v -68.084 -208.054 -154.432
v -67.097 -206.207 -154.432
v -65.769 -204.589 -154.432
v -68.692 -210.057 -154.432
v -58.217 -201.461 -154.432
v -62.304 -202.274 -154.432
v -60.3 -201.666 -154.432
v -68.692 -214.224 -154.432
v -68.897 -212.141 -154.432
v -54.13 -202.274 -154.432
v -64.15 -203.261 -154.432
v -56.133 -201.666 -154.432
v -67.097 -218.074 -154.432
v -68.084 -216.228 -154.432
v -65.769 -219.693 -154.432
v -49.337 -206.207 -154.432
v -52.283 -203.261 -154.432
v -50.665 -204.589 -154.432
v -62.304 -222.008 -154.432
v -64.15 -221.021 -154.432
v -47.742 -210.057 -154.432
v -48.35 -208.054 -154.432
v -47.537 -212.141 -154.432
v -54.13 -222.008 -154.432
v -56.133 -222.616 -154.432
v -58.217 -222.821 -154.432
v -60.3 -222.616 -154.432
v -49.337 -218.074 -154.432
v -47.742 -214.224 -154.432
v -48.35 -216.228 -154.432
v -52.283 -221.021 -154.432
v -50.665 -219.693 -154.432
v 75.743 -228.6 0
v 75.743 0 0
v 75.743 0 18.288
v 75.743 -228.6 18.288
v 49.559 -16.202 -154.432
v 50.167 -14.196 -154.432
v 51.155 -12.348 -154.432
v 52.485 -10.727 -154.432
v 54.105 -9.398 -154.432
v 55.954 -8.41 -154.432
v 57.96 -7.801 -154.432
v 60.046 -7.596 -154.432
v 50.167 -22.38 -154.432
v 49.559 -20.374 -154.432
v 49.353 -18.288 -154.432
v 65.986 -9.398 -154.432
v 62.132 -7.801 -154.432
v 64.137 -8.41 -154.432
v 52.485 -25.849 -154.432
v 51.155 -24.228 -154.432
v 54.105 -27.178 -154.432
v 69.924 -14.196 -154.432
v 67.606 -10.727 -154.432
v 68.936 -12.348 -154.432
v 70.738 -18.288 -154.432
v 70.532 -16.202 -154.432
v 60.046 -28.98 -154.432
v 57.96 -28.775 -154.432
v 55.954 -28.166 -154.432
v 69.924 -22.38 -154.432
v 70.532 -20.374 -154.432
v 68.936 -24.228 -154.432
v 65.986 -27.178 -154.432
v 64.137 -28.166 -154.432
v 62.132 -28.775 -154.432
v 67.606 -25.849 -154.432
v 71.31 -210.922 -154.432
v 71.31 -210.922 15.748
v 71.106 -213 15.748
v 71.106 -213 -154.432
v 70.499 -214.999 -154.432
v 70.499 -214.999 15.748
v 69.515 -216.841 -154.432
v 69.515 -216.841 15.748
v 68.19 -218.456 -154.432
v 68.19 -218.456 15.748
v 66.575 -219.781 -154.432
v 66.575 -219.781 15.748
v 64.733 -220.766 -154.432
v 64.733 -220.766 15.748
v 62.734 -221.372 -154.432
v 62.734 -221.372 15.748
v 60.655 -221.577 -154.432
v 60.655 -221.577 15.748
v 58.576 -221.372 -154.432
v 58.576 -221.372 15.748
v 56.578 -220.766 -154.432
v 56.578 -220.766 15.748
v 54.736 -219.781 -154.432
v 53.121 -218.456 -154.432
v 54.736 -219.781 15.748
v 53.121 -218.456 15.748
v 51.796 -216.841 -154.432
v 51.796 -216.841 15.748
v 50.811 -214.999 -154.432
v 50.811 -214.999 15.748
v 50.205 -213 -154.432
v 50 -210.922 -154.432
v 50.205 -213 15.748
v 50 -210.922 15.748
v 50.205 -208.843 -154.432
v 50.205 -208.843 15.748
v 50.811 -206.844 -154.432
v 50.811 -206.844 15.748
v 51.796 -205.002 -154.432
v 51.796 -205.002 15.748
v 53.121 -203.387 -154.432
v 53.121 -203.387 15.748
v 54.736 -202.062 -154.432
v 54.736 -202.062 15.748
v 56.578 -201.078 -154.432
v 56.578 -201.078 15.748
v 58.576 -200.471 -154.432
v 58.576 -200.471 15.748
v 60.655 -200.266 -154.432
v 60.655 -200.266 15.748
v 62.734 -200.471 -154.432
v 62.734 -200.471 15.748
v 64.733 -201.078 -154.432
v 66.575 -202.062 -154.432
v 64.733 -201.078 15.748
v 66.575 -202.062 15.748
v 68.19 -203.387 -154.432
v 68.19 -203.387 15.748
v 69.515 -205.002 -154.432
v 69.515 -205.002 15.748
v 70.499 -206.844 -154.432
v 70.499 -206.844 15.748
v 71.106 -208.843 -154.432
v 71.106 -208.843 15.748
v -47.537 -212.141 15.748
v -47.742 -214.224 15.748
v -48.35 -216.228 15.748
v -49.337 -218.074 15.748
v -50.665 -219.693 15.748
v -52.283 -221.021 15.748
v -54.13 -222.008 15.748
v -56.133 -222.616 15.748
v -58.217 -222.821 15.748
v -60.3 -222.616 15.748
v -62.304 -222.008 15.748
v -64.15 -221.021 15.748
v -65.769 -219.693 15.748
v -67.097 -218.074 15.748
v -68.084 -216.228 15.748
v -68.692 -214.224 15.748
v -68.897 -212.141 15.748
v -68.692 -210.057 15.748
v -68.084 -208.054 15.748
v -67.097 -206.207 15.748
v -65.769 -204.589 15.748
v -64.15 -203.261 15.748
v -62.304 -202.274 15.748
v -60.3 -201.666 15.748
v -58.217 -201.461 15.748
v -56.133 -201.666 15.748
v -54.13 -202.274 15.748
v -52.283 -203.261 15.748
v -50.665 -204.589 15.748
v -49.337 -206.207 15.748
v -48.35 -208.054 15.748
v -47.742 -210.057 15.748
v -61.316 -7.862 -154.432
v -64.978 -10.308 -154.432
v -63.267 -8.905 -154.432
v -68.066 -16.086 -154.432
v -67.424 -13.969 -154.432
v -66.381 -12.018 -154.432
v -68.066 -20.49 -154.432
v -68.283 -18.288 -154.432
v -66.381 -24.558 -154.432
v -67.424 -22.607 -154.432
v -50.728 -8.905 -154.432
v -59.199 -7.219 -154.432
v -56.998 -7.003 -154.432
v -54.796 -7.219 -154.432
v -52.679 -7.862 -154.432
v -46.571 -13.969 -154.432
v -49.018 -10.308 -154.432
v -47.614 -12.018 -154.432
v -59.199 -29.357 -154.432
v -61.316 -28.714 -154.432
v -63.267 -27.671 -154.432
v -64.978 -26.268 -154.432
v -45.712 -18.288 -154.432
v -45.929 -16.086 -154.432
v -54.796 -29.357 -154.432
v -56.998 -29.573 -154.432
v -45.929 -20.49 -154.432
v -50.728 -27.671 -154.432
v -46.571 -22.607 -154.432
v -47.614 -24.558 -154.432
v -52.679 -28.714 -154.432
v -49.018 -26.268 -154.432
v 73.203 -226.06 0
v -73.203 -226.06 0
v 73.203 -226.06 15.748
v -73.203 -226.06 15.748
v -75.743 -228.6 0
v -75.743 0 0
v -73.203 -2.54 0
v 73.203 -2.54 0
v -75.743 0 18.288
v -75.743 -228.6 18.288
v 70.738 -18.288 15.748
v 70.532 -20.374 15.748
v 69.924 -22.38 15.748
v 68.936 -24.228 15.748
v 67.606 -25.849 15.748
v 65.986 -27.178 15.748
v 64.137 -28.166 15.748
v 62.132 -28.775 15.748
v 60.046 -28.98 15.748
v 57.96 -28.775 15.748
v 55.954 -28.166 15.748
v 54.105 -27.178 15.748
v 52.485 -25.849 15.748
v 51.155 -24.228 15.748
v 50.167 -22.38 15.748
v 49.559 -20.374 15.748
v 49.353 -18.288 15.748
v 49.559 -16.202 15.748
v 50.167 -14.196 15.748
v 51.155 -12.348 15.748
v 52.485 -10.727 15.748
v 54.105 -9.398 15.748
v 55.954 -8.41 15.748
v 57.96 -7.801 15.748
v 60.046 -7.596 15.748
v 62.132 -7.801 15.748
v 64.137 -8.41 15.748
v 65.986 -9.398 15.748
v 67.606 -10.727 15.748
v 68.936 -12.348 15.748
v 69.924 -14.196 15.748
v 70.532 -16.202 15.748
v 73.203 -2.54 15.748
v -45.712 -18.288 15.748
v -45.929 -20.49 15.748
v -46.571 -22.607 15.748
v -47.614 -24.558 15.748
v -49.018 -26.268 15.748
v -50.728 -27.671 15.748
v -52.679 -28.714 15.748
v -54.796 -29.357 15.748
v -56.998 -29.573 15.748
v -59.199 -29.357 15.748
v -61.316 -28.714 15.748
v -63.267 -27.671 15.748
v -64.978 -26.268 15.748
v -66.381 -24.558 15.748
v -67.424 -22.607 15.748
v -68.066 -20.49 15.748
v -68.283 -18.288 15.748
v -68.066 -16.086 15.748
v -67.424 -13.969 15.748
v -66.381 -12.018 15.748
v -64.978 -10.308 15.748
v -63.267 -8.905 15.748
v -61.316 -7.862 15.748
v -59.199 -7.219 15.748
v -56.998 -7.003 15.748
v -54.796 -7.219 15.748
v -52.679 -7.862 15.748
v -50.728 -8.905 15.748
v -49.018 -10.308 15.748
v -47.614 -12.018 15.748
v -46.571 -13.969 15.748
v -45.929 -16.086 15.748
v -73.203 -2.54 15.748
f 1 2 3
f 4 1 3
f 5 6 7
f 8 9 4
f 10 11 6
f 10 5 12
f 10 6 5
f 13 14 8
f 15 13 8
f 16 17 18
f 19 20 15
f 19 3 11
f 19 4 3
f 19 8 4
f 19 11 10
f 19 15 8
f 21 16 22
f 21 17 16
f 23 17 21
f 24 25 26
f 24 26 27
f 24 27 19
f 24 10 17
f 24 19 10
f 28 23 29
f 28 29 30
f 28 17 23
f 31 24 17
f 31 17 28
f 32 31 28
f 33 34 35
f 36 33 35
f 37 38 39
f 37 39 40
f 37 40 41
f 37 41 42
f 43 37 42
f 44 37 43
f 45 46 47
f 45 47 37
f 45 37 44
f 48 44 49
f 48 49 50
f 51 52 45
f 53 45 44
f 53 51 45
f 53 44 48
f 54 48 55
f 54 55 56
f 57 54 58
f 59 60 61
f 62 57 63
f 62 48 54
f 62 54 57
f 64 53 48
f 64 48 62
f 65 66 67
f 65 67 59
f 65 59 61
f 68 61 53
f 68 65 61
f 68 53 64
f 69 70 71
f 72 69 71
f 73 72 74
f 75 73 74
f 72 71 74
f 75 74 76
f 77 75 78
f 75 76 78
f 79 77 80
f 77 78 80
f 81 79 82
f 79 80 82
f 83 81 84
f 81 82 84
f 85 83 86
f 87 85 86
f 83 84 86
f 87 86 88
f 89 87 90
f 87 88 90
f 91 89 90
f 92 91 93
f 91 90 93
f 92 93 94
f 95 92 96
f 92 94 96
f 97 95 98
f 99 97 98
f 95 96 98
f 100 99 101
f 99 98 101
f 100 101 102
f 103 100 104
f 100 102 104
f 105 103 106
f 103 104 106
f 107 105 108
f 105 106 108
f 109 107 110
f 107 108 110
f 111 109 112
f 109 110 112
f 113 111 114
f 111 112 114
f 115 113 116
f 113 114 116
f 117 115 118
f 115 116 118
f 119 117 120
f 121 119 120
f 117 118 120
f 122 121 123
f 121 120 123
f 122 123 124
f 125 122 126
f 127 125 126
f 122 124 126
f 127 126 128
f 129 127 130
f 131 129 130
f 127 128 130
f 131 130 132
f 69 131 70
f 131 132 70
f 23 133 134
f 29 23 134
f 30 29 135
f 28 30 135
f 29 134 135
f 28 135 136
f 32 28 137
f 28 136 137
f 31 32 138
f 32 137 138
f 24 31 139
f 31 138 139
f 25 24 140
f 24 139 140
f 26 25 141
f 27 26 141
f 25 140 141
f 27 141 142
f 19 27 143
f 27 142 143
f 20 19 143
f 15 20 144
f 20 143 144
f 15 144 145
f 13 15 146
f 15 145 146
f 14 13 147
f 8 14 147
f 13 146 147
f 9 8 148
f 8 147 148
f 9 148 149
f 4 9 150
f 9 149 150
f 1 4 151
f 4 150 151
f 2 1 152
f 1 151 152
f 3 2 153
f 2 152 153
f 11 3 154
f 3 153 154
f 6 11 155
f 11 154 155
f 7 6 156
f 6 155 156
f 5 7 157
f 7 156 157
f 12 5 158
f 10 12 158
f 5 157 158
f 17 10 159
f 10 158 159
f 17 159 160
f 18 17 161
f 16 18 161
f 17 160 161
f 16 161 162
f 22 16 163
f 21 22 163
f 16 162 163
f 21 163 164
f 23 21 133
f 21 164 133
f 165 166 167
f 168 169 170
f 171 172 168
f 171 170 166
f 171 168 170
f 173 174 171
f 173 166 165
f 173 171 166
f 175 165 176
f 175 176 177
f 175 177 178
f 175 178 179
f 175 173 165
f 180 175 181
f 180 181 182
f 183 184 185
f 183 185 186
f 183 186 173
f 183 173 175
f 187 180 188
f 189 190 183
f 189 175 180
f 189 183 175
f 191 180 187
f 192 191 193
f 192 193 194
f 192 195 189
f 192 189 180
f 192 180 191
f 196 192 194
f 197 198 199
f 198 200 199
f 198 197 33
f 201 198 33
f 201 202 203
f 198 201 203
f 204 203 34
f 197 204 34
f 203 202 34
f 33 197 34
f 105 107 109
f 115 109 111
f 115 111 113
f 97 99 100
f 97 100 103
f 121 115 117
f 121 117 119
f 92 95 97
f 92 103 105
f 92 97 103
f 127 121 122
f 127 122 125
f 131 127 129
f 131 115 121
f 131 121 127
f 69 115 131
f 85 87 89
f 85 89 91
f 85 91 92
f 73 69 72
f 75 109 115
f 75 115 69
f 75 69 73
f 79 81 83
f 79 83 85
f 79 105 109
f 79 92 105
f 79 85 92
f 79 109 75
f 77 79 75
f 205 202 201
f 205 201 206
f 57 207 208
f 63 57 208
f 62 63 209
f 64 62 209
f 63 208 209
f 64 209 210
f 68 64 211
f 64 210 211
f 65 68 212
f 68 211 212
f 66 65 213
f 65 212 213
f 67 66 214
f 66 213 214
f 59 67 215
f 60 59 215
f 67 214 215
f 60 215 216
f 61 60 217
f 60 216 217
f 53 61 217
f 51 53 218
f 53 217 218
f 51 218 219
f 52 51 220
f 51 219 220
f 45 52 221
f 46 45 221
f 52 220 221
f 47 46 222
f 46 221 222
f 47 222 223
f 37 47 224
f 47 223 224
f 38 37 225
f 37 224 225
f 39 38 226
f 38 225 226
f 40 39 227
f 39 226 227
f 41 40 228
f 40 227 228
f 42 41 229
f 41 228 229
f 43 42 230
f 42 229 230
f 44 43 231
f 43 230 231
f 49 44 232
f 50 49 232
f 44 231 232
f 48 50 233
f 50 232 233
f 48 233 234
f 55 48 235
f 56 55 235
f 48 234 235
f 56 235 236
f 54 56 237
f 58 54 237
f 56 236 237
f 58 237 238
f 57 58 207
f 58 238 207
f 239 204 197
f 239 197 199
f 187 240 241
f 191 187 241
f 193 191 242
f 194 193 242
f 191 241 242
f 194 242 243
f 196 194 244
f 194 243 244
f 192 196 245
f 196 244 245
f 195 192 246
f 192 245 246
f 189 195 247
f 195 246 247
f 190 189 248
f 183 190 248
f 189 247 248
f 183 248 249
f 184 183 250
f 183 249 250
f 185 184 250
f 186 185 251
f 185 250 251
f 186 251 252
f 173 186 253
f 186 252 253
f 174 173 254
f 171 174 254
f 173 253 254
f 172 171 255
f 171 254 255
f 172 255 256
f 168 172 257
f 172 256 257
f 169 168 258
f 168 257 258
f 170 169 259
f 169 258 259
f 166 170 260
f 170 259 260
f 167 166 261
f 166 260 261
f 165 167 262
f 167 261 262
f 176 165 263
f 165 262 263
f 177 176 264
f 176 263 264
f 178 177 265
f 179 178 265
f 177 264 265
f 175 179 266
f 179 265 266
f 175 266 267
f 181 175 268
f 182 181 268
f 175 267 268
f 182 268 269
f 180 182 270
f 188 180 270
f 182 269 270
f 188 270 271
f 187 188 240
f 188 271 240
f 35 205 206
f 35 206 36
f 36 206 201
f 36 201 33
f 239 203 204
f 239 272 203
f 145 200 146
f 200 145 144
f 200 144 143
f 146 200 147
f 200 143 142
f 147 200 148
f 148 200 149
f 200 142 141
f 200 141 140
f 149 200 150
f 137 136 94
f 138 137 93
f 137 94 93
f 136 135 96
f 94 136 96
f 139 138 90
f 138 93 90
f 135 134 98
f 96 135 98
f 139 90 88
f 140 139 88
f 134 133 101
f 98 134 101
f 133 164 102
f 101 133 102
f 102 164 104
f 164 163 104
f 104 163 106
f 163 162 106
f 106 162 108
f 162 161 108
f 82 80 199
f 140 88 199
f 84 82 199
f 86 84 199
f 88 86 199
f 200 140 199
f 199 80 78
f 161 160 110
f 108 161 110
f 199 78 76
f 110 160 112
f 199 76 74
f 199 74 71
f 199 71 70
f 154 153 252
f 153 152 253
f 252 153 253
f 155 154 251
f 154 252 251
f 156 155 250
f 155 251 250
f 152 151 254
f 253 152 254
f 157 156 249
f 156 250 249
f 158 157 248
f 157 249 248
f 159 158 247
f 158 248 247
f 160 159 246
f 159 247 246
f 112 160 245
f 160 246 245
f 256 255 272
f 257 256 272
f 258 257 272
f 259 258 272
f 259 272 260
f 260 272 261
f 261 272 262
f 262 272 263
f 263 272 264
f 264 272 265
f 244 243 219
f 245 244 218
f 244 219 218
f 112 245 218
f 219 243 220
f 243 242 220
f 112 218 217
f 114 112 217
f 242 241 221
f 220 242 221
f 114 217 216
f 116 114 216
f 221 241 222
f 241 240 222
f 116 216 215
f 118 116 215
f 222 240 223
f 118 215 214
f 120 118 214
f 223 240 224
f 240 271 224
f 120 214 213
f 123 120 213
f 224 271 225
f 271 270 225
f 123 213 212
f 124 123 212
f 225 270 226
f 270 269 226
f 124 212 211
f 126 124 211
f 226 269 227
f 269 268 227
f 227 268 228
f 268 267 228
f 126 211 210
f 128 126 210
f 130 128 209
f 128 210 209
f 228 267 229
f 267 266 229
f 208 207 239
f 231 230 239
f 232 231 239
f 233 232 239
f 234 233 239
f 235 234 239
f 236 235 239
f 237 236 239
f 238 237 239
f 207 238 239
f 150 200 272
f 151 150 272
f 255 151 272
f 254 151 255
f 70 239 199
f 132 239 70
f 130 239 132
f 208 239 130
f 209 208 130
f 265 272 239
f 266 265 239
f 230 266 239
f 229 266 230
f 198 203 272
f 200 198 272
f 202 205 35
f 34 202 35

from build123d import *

# Parameters (mm, degrees)
F0_W     = 151.485607028
F0_H     = 18.2879995555
F1_DEPTH = 228.6
F2_T     = -2.54
F3_R     = 10.6799813772
F3_R_2   = 11.2854145599
F3_R_3   = 10.6922207588
F3_R_4   = 10.6551247764
F8_DEPTH = 170.18


# Not quite as in the source:
# - the program builds the solid bodies; features that only make, move or delete a surface that nothing else refers to are left out


with BuildPart() as f1:
    # F0 (on Front) → F1 (new body)
    with BuildSketch(Plane.XZ):
        with Locations((0, 9.1439997777)):
            Rectangle(F0_W, F0_H)
    extrude(amount=F1_DEPTH)

    # F2
    f2_openings = [f1.faces().sort_by_distance(p)[0] for p in [
        (0, -114.3, 0),
    ]]
    offset(amount=F2_T, openings=f2_openings)

    # F3 (on face) → F8 (join)
    with BuildSketch(Plane(origin=(0, 0, 15.7479995555), x_dir=(1, 0, 0), z_dir=(0, 0, -1))):
        with Locations((-58.2167990506, 212.1407985687)):
            Circle(F3_R)
        with Locations((-56.9975972176, 18.2879958302)):
            Circle(F3_R_2)
        with Locations((60.0456036627, 18.2879958302)):
            Circle(F3_R_3)
        with Locations((60.6552027166, 210.921600461)):
            Circle(F3_R_4)
    extrude(amount=F8_DEPTH)


solid = f1.part
